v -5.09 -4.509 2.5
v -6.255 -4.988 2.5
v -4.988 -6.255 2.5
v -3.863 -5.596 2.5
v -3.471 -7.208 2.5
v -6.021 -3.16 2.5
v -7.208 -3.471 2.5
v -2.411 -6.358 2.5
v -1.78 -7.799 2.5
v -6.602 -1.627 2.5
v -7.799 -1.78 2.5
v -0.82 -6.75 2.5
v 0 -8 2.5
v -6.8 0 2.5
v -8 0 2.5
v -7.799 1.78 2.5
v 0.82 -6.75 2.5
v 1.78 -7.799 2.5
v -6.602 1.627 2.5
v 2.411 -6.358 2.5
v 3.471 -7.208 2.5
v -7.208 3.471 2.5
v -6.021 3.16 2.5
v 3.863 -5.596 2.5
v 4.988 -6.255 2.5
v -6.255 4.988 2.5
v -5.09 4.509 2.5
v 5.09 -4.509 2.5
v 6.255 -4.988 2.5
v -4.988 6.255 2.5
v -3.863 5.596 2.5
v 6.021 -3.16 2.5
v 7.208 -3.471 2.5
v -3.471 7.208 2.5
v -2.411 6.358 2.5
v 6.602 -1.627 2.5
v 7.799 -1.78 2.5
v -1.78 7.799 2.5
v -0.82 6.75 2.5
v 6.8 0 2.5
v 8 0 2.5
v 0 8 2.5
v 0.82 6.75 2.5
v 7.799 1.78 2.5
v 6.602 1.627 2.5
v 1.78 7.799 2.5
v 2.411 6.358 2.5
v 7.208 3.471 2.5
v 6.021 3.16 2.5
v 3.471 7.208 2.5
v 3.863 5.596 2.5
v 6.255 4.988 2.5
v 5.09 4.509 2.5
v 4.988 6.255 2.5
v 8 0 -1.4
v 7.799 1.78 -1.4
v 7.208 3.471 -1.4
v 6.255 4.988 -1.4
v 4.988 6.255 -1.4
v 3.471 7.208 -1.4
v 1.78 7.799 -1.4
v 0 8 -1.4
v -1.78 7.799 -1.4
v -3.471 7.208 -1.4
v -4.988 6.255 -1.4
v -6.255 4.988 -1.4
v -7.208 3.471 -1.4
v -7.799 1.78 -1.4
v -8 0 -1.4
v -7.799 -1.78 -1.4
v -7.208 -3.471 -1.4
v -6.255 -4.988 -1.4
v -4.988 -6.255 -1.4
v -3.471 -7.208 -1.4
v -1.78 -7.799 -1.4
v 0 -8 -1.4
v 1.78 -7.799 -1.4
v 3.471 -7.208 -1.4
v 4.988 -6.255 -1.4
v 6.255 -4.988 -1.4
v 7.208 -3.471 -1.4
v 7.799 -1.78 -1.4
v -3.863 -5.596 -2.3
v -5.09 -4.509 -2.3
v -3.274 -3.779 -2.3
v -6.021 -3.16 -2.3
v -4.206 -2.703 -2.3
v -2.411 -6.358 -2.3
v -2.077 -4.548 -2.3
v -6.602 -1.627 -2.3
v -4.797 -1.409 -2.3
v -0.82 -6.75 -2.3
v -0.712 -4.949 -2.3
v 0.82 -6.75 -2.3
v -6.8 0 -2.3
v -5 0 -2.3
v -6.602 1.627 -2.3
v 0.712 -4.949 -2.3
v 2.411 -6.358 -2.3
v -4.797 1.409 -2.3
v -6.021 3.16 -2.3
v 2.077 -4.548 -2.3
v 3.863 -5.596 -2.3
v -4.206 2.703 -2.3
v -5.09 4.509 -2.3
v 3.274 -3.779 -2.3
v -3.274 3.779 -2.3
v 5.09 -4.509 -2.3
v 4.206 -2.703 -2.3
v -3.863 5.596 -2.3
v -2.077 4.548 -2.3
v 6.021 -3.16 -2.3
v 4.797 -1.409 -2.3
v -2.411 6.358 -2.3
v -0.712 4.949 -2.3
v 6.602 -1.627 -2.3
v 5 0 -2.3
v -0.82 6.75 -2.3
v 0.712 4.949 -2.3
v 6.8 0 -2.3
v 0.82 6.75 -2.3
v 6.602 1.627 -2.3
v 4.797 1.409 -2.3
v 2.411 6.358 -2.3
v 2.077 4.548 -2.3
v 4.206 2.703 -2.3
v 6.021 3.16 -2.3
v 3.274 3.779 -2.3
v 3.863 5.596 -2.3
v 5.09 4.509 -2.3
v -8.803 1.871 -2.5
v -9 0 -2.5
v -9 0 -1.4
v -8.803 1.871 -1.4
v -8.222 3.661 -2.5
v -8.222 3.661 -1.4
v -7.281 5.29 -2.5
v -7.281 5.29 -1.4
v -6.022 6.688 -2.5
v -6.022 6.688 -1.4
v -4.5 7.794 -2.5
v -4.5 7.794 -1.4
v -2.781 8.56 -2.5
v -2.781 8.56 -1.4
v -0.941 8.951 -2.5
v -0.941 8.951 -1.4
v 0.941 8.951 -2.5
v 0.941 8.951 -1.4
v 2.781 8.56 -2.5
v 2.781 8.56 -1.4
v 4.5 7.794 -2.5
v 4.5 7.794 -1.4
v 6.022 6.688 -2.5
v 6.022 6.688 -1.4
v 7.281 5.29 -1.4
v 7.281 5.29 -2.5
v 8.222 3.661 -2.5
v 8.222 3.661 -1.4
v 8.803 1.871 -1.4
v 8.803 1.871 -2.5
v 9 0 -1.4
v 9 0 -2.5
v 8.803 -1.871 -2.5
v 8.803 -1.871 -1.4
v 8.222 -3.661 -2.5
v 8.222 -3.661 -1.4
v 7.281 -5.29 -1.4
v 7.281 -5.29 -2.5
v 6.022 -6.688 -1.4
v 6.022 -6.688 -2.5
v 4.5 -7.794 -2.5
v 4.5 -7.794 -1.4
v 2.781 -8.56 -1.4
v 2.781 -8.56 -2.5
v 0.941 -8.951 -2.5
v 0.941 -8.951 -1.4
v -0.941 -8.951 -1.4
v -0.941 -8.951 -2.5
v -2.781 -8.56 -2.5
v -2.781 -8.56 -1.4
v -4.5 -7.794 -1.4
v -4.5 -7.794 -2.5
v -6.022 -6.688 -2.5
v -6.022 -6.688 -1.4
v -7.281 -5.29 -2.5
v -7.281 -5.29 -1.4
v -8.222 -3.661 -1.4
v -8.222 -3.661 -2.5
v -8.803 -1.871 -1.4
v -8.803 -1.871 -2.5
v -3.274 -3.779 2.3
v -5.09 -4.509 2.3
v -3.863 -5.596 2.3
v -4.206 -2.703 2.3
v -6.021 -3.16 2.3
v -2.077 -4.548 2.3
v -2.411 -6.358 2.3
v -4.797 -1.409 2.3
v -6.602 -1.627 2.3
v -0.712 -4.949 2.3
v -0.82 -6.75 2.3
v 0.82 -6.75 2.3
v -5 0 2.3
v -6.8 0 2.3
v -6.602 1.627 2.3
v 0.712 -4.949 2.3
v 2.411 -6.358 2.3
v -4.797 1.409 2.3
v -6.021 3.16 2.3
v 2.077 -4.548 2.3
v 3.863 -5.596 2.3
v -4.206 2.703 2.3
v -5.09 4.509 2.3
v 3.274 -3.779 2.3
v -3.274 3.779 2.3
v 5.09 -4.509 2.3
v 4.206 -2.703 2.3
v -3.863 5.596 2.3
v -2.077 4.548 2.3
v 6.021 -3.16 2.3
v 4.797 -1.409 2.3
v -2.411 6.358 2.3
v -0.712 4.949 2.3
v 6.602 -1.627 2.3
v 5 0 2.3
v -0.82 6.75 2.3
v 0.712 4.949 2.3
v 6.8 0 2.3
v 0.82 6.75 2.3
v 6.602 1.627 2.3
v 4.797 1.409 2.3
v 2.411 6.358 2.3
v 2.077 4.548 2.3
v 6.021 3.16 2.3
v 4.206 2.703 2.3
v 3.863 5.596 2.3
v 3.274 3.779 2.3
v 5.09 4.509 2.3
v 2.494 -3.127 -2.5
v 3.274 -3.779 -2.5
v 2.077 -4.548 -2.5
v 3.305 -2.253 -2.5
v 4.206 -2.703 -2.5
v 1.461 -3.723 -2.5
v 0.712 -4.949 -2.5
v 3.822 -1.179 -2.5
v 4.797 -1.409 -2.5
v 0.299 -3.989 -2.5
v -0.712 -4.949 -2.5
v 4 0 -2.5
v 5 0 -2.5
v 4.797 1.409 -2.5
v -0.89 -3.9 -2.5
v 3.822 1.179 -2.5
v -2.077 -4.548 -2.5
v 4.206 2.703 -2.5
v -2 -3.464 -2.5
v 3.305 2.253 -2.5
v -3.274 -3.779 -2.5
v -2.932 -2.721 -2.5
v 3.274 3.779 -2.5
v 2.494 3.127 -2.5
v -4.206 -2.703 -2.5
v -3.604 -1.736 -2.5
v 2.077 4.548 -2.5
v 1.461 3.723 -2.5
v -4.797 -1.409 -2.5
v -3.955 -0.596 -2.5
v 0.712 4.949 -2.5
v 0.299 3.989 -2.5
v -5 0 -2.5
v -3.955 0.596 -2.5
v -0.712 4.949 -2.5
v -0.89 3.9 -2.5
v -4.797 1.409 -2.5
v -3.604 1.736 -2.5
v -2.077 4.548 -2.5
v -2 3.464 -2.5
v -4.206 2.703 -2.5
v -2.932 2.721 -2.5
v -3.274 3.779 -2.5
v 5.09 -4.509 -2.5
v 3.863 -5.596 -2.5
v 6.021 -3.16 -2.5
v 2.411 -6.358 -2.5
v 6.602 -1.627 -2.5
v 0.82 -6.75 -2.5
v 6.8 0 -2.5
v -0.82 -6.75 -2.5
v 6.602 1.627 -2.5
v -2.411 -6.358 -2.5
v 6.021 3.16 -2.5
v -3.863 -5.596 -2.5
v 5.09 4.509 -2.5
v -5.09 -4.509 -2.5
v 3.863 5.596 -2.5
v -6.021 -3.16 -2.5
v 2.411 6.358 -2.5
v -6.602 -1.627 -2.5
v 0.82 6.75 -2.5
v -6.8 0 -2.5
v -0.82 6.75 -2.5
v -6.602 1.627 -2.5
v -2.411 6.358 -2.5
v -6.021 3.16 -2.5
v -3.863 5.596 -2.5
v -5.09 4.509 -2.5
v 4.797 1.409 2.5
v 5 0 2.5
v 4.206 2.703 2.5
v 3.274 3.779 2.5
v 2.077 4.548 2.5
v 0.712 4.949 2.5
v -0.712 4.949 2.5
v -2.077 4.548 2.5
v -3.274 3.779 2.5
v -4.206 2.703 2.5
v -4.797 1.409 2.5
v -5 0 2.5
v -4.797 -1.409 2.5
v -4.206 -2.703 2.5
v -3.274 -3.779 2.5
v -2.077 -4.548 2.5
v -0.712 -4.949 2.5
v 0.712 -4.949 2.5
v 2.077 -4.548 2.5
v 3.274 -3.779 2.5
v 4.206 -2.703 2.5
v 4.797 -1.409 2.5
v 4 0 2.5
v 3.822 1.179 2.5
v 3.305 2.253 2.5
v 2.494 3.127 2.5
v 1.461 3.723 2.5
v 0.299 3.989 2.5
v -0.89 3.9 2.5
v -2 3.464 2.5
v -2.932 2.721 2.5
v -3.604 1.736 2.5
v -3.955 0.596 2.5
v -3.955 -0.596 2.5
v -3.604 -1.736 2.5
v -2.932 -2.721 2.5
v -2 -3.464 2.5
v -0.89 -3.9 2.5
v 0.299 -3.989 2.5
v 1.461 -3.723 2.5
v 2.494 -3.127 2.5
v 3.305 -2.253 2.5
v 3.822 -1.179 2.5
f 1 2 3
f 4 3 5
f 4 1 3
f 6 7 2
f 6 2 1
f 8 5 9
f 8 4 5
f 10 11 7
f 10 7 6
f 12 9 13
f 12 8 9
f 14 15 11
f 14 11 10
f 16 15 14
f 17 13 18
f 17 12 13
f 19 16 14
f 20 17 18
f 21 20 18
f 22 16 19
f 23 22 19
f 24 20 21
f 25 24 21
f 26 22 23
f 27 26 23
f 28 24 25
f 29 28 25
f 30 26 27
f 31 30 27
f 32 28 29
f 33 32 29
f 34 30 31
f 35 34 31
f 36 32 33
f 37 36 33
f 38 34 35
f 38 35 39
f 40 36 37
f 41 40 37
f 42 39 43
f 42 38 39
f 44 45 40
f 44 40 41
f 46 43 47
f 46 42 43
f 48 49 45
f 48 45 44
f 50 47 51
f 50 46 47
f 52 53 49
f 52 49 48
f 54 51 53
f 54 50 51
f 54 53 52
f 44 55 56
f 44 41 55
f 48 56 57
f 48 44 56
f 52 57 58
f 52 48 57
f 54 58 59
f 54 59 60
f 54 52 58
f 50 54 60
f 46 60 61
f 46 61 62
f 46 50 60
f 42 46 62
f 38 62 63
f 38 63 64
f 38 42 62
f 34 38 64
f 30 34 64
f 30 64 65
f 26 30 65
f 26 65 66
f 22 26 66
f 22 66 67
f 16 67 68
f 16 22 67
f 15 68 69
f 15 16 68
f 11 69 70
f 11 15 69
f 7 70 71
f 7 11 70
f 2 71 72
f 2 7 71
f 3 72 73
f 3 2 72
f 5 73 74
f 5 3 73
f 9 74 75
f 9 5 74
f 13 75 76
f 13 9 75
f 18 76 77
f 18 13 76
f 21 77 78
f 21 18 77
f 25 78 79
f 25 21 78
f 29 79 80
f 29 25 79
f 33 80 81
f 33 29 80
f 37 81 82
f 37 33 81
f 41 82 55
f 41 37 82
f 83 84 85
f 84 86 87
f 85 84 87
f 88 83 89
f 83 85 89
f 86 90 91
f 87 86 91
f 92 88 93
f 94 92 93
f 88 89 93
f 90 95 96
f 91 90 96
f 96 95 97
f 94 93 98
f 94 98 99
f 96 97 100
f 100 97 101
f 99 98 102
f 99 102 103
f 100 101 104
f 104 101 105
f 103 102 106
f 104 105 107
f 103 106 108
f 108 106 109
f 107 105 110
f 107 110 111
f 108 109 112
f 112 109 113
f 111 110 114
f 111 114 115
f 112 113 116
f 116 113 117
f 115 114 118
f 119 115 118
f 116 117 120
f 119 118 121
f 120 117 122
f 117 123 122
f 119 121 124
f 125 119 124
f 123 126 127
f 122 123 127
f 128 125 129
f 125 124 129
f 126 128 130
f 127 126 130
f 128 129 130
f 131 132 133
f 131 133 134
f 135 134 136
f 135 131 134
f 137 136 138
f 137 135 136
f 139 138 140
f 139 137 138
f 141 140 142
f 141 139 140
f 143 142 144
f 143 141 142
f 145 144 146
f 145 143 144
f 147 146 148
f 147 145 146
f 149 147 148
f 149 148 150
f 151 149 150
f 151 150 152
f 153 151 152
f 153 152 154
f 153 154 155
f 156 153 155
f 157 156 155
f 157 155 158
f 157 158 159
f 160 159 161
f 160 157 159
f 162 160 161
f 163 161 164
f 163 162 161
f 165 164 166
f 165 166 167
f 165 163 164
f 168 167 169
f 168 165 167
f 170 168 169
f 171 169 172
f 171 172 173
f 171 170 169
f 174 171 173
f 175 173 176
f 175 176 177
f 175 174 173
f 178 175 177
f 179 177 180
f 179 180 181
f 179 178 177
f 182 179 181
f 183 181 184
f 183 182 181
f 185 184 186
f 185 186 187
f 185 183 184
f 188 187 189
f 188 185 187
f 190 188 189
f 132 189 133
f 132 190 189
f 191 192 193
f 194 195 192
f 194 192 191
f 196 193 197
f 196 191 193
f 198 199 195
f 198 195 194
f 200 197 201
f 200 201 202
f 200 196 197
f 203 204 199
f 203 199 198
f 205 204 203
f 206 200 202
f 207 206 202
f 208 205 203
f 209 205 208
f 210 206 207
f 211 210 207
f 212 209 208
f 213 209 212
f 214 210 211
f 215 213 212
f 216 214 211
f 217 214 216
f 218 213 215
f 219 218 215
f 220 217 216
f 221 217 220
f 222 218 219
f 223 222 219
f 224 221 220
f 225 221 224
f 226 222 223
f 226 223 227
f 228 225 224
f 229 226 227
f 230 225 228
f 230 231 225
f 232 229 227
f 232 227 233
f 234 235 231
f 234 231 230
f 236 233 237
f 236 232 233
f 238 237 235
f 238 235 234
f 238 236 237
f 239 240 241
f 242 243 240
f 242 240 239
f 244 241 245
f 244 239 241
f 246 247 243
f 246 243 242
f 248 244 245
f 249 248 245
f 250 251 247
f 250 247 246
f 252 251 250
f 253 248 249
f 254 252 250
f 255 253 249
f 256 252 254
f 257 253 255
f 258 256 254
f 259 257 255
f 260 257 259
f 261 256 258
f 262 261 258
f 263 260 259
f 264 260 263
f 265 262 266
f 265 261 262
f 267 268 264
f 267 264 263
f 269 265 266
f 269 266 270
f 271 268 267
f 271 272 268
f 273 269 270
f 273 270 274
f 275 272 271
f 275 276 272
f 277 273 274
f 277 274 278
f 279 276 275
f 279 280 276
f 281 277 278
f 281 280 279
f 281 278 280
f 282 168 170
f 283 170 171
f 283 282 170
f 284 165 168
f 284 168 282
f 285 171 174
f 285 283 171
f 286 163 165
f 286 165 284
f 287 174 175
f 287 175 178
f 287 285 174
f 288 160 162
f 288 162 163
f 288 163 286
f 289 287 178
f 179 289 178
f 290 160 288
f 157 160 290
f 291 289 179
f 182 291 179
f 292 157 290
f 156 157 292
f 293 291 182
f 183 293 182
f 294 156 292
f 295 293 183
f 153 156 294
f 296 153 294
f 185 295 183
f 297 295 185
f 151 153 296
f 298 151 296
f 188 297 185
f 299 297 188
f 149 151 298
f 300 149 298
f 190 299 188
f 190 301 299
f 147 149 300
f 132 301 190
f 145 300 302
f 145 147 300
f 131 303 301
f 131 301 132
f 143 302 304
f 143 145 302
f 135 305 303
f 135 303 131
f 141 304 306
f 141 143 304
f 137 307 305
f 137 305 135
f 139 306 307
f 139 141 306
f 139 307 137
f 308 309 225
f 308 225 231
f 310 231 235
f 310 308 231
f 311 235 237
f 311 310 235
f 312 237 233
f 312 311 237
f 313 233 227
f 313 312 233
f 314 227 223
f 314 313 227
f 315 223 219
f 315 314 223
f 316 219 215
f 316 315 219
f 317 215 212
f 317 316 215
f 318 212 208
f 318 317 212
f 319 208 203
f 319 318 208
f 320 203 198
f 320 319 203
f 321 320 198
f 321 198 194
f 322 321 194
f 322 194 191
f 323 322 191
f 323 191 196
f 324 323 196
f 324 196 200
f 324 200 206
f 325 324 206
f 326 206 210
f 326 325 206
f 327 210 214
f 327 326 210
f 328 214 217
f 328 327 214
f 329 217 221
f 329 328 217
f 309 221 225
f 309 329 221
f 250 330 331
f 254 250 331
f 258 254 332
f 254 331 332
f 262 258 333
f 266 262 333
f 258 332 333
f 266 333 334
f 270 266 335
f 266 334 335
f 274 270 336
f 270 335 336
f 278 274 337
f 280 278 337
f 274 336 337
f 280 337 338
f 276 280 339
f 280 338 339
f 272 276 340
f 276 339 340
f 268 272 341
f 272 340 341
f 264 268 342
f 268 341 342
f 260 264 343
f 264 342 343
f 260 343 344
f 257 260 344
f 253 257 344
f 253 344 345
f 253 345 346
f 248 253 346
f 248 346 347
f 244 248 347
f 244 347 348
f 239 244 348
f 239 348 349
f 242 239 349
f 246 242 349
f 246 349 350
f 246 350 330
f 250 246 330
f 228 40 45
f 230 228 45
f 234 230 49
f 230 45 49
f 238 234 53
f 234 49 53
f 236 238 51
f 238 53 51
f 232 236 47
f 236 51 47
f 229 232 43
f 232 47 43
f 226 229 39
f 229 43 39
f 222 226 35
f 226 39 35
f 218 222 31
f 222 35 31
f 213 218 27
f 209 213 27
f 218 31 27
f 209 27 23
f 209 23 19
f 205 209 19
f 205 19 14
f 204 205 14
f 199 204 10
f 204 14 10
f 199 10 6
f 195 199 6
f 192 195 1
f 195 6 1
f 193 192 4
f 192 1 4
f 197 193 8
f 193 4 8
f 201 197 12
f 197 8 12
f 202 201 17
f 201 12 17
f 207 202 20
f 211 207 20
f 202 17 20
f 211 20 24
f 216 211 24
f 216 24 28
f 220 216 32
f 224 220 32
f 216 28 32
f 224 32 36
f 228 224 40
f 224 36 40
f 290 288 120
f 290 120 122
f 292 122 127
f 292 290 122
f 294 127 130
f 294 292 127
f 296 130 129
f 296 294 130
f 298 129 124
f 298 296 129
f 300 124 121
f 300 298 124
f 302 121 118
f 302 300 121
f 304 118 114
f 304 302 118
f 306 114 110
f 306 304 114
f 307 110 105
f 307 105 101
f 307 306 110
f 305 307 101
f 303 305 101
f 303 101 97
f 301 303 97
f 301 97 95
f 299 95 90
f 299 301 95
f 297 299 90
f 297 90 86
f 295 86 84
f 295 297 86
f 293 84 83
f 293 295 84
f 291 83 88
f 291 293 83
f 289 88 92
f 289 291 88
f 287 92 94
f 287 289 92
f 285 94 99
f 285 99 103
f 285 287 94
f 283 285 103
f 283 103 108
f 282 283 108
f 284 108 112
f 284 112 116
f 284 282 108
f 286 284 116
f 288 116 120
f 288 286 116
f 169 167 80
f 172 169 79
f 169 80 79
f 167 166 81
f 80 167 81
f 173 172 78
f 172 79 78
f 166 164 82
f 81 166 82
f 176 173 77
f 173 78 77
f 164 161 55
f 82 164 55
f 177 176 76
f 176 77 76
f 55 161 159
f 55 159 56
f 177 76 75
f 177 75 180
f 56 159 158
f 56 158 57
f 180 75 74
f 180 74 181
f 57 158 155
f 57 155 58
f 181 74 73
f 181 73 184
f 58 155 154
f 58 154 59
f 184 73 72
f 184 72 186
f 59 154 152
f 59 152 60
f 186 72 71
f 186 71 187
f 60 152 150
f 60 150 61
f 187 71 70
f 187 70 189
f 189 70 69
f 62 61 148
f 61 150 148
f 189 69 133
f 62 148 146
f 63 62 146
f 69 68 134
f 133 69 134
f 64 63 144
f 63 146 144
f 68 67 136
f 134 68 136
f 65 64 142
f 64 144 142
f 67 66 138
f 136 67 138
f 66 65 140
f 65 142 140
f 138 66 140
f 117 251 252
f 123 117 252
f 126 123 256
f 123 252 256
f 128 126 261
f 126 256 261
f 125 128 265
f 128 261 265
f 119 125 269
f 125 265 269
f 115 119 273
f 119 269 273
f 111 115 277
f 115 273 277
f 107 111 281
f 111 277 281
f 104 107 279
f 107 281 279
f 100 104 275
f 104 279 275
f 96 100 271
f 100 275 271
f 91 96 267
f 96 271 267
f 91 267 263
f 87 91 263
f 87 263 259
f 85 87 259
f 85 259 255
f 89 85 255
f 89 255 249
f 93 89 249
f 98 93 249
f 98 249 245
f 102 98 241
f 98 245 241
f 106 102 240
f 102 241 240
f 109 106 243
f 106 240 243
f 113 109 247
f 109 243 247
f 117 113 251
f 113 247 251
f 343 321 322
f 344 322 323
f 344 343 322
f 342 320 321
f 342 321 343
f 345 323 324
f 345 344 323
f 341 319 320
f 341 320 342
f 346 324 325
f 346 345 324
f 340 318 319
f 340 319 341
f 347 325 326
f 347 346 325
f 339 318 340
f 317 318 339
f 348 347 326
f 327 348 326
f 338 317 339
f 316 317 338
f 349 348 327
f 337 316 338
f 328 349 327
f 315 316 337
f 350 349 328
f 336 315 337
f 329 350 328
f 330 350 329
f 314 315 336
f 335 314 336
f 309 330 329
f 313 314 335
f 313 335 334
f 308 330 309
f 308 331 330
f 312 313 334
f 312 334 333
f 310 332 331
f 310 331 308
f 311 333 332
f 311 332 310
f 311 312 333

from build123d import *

# Parameters (mm, degrees)
SKETCH_1_R          = 8
EXTRUDE_1_DEPTH     = 2.5
SKETCH_4_R          = 9
EXTRUDE_2_DEPTH     = 1.1
SKETCH_2_R          = 4
CUT_EXTRUDE_1_DEPTH = 6
SKETCH_3_R          = 6.8
SKETCH_3_R_2        = 5
CUT_EXTRUDE_2_DEPTH = 0.2


with BuildPart() as part:
    # 草圖1 → 填料-伸長1 (new body, symmetric)
    with BuildSketch(Plane.XY):
        Circle(SKETCH_1_R)
    extrude(amount=EXTRUDE_1_DEPTH, both=True)

    # 草圖4 → 填料-伸長2 (add)
    with BuildSketch(Plane(origin=(0, 0, -2.5), x_dir=(-1, 0, 0), z_dir=(0, 0, -1))):
        Circle(SKETCH_4_R)
    extrude(amount=-EXTRUDE_2_DEPTH)

    # 草圖2 → 除料-伸長1 (cut, through all)
    with BuildSketch(Plane.XY.offset(2.5)):
        Circle(SKETCH_2_R)
    extrude(amount=-CUT_EXTRUDE_1_DEPTH, mode=Mode.SUBTRACT)

    # 草圖3 → 除料-伸長2 (cut)
    with BuildSketch(Plane.XY.offset(2.5)):
        Circle(SKETCH_3_R)
        Circle(SKETCH_3_R_2, mode=Mode.SUBTRACT)
    cut_extrude_2 = extrude(amount=-CUT_EXTRUDE_2_DEPTH, mode=Mode.SUBTRACT)

    # 鏡射1: 除料-伸長2 across plane
    add(cut_extrude_2.mirror(Plane.XY), mode=Mode.SUBTRACT)


solid = part.part
